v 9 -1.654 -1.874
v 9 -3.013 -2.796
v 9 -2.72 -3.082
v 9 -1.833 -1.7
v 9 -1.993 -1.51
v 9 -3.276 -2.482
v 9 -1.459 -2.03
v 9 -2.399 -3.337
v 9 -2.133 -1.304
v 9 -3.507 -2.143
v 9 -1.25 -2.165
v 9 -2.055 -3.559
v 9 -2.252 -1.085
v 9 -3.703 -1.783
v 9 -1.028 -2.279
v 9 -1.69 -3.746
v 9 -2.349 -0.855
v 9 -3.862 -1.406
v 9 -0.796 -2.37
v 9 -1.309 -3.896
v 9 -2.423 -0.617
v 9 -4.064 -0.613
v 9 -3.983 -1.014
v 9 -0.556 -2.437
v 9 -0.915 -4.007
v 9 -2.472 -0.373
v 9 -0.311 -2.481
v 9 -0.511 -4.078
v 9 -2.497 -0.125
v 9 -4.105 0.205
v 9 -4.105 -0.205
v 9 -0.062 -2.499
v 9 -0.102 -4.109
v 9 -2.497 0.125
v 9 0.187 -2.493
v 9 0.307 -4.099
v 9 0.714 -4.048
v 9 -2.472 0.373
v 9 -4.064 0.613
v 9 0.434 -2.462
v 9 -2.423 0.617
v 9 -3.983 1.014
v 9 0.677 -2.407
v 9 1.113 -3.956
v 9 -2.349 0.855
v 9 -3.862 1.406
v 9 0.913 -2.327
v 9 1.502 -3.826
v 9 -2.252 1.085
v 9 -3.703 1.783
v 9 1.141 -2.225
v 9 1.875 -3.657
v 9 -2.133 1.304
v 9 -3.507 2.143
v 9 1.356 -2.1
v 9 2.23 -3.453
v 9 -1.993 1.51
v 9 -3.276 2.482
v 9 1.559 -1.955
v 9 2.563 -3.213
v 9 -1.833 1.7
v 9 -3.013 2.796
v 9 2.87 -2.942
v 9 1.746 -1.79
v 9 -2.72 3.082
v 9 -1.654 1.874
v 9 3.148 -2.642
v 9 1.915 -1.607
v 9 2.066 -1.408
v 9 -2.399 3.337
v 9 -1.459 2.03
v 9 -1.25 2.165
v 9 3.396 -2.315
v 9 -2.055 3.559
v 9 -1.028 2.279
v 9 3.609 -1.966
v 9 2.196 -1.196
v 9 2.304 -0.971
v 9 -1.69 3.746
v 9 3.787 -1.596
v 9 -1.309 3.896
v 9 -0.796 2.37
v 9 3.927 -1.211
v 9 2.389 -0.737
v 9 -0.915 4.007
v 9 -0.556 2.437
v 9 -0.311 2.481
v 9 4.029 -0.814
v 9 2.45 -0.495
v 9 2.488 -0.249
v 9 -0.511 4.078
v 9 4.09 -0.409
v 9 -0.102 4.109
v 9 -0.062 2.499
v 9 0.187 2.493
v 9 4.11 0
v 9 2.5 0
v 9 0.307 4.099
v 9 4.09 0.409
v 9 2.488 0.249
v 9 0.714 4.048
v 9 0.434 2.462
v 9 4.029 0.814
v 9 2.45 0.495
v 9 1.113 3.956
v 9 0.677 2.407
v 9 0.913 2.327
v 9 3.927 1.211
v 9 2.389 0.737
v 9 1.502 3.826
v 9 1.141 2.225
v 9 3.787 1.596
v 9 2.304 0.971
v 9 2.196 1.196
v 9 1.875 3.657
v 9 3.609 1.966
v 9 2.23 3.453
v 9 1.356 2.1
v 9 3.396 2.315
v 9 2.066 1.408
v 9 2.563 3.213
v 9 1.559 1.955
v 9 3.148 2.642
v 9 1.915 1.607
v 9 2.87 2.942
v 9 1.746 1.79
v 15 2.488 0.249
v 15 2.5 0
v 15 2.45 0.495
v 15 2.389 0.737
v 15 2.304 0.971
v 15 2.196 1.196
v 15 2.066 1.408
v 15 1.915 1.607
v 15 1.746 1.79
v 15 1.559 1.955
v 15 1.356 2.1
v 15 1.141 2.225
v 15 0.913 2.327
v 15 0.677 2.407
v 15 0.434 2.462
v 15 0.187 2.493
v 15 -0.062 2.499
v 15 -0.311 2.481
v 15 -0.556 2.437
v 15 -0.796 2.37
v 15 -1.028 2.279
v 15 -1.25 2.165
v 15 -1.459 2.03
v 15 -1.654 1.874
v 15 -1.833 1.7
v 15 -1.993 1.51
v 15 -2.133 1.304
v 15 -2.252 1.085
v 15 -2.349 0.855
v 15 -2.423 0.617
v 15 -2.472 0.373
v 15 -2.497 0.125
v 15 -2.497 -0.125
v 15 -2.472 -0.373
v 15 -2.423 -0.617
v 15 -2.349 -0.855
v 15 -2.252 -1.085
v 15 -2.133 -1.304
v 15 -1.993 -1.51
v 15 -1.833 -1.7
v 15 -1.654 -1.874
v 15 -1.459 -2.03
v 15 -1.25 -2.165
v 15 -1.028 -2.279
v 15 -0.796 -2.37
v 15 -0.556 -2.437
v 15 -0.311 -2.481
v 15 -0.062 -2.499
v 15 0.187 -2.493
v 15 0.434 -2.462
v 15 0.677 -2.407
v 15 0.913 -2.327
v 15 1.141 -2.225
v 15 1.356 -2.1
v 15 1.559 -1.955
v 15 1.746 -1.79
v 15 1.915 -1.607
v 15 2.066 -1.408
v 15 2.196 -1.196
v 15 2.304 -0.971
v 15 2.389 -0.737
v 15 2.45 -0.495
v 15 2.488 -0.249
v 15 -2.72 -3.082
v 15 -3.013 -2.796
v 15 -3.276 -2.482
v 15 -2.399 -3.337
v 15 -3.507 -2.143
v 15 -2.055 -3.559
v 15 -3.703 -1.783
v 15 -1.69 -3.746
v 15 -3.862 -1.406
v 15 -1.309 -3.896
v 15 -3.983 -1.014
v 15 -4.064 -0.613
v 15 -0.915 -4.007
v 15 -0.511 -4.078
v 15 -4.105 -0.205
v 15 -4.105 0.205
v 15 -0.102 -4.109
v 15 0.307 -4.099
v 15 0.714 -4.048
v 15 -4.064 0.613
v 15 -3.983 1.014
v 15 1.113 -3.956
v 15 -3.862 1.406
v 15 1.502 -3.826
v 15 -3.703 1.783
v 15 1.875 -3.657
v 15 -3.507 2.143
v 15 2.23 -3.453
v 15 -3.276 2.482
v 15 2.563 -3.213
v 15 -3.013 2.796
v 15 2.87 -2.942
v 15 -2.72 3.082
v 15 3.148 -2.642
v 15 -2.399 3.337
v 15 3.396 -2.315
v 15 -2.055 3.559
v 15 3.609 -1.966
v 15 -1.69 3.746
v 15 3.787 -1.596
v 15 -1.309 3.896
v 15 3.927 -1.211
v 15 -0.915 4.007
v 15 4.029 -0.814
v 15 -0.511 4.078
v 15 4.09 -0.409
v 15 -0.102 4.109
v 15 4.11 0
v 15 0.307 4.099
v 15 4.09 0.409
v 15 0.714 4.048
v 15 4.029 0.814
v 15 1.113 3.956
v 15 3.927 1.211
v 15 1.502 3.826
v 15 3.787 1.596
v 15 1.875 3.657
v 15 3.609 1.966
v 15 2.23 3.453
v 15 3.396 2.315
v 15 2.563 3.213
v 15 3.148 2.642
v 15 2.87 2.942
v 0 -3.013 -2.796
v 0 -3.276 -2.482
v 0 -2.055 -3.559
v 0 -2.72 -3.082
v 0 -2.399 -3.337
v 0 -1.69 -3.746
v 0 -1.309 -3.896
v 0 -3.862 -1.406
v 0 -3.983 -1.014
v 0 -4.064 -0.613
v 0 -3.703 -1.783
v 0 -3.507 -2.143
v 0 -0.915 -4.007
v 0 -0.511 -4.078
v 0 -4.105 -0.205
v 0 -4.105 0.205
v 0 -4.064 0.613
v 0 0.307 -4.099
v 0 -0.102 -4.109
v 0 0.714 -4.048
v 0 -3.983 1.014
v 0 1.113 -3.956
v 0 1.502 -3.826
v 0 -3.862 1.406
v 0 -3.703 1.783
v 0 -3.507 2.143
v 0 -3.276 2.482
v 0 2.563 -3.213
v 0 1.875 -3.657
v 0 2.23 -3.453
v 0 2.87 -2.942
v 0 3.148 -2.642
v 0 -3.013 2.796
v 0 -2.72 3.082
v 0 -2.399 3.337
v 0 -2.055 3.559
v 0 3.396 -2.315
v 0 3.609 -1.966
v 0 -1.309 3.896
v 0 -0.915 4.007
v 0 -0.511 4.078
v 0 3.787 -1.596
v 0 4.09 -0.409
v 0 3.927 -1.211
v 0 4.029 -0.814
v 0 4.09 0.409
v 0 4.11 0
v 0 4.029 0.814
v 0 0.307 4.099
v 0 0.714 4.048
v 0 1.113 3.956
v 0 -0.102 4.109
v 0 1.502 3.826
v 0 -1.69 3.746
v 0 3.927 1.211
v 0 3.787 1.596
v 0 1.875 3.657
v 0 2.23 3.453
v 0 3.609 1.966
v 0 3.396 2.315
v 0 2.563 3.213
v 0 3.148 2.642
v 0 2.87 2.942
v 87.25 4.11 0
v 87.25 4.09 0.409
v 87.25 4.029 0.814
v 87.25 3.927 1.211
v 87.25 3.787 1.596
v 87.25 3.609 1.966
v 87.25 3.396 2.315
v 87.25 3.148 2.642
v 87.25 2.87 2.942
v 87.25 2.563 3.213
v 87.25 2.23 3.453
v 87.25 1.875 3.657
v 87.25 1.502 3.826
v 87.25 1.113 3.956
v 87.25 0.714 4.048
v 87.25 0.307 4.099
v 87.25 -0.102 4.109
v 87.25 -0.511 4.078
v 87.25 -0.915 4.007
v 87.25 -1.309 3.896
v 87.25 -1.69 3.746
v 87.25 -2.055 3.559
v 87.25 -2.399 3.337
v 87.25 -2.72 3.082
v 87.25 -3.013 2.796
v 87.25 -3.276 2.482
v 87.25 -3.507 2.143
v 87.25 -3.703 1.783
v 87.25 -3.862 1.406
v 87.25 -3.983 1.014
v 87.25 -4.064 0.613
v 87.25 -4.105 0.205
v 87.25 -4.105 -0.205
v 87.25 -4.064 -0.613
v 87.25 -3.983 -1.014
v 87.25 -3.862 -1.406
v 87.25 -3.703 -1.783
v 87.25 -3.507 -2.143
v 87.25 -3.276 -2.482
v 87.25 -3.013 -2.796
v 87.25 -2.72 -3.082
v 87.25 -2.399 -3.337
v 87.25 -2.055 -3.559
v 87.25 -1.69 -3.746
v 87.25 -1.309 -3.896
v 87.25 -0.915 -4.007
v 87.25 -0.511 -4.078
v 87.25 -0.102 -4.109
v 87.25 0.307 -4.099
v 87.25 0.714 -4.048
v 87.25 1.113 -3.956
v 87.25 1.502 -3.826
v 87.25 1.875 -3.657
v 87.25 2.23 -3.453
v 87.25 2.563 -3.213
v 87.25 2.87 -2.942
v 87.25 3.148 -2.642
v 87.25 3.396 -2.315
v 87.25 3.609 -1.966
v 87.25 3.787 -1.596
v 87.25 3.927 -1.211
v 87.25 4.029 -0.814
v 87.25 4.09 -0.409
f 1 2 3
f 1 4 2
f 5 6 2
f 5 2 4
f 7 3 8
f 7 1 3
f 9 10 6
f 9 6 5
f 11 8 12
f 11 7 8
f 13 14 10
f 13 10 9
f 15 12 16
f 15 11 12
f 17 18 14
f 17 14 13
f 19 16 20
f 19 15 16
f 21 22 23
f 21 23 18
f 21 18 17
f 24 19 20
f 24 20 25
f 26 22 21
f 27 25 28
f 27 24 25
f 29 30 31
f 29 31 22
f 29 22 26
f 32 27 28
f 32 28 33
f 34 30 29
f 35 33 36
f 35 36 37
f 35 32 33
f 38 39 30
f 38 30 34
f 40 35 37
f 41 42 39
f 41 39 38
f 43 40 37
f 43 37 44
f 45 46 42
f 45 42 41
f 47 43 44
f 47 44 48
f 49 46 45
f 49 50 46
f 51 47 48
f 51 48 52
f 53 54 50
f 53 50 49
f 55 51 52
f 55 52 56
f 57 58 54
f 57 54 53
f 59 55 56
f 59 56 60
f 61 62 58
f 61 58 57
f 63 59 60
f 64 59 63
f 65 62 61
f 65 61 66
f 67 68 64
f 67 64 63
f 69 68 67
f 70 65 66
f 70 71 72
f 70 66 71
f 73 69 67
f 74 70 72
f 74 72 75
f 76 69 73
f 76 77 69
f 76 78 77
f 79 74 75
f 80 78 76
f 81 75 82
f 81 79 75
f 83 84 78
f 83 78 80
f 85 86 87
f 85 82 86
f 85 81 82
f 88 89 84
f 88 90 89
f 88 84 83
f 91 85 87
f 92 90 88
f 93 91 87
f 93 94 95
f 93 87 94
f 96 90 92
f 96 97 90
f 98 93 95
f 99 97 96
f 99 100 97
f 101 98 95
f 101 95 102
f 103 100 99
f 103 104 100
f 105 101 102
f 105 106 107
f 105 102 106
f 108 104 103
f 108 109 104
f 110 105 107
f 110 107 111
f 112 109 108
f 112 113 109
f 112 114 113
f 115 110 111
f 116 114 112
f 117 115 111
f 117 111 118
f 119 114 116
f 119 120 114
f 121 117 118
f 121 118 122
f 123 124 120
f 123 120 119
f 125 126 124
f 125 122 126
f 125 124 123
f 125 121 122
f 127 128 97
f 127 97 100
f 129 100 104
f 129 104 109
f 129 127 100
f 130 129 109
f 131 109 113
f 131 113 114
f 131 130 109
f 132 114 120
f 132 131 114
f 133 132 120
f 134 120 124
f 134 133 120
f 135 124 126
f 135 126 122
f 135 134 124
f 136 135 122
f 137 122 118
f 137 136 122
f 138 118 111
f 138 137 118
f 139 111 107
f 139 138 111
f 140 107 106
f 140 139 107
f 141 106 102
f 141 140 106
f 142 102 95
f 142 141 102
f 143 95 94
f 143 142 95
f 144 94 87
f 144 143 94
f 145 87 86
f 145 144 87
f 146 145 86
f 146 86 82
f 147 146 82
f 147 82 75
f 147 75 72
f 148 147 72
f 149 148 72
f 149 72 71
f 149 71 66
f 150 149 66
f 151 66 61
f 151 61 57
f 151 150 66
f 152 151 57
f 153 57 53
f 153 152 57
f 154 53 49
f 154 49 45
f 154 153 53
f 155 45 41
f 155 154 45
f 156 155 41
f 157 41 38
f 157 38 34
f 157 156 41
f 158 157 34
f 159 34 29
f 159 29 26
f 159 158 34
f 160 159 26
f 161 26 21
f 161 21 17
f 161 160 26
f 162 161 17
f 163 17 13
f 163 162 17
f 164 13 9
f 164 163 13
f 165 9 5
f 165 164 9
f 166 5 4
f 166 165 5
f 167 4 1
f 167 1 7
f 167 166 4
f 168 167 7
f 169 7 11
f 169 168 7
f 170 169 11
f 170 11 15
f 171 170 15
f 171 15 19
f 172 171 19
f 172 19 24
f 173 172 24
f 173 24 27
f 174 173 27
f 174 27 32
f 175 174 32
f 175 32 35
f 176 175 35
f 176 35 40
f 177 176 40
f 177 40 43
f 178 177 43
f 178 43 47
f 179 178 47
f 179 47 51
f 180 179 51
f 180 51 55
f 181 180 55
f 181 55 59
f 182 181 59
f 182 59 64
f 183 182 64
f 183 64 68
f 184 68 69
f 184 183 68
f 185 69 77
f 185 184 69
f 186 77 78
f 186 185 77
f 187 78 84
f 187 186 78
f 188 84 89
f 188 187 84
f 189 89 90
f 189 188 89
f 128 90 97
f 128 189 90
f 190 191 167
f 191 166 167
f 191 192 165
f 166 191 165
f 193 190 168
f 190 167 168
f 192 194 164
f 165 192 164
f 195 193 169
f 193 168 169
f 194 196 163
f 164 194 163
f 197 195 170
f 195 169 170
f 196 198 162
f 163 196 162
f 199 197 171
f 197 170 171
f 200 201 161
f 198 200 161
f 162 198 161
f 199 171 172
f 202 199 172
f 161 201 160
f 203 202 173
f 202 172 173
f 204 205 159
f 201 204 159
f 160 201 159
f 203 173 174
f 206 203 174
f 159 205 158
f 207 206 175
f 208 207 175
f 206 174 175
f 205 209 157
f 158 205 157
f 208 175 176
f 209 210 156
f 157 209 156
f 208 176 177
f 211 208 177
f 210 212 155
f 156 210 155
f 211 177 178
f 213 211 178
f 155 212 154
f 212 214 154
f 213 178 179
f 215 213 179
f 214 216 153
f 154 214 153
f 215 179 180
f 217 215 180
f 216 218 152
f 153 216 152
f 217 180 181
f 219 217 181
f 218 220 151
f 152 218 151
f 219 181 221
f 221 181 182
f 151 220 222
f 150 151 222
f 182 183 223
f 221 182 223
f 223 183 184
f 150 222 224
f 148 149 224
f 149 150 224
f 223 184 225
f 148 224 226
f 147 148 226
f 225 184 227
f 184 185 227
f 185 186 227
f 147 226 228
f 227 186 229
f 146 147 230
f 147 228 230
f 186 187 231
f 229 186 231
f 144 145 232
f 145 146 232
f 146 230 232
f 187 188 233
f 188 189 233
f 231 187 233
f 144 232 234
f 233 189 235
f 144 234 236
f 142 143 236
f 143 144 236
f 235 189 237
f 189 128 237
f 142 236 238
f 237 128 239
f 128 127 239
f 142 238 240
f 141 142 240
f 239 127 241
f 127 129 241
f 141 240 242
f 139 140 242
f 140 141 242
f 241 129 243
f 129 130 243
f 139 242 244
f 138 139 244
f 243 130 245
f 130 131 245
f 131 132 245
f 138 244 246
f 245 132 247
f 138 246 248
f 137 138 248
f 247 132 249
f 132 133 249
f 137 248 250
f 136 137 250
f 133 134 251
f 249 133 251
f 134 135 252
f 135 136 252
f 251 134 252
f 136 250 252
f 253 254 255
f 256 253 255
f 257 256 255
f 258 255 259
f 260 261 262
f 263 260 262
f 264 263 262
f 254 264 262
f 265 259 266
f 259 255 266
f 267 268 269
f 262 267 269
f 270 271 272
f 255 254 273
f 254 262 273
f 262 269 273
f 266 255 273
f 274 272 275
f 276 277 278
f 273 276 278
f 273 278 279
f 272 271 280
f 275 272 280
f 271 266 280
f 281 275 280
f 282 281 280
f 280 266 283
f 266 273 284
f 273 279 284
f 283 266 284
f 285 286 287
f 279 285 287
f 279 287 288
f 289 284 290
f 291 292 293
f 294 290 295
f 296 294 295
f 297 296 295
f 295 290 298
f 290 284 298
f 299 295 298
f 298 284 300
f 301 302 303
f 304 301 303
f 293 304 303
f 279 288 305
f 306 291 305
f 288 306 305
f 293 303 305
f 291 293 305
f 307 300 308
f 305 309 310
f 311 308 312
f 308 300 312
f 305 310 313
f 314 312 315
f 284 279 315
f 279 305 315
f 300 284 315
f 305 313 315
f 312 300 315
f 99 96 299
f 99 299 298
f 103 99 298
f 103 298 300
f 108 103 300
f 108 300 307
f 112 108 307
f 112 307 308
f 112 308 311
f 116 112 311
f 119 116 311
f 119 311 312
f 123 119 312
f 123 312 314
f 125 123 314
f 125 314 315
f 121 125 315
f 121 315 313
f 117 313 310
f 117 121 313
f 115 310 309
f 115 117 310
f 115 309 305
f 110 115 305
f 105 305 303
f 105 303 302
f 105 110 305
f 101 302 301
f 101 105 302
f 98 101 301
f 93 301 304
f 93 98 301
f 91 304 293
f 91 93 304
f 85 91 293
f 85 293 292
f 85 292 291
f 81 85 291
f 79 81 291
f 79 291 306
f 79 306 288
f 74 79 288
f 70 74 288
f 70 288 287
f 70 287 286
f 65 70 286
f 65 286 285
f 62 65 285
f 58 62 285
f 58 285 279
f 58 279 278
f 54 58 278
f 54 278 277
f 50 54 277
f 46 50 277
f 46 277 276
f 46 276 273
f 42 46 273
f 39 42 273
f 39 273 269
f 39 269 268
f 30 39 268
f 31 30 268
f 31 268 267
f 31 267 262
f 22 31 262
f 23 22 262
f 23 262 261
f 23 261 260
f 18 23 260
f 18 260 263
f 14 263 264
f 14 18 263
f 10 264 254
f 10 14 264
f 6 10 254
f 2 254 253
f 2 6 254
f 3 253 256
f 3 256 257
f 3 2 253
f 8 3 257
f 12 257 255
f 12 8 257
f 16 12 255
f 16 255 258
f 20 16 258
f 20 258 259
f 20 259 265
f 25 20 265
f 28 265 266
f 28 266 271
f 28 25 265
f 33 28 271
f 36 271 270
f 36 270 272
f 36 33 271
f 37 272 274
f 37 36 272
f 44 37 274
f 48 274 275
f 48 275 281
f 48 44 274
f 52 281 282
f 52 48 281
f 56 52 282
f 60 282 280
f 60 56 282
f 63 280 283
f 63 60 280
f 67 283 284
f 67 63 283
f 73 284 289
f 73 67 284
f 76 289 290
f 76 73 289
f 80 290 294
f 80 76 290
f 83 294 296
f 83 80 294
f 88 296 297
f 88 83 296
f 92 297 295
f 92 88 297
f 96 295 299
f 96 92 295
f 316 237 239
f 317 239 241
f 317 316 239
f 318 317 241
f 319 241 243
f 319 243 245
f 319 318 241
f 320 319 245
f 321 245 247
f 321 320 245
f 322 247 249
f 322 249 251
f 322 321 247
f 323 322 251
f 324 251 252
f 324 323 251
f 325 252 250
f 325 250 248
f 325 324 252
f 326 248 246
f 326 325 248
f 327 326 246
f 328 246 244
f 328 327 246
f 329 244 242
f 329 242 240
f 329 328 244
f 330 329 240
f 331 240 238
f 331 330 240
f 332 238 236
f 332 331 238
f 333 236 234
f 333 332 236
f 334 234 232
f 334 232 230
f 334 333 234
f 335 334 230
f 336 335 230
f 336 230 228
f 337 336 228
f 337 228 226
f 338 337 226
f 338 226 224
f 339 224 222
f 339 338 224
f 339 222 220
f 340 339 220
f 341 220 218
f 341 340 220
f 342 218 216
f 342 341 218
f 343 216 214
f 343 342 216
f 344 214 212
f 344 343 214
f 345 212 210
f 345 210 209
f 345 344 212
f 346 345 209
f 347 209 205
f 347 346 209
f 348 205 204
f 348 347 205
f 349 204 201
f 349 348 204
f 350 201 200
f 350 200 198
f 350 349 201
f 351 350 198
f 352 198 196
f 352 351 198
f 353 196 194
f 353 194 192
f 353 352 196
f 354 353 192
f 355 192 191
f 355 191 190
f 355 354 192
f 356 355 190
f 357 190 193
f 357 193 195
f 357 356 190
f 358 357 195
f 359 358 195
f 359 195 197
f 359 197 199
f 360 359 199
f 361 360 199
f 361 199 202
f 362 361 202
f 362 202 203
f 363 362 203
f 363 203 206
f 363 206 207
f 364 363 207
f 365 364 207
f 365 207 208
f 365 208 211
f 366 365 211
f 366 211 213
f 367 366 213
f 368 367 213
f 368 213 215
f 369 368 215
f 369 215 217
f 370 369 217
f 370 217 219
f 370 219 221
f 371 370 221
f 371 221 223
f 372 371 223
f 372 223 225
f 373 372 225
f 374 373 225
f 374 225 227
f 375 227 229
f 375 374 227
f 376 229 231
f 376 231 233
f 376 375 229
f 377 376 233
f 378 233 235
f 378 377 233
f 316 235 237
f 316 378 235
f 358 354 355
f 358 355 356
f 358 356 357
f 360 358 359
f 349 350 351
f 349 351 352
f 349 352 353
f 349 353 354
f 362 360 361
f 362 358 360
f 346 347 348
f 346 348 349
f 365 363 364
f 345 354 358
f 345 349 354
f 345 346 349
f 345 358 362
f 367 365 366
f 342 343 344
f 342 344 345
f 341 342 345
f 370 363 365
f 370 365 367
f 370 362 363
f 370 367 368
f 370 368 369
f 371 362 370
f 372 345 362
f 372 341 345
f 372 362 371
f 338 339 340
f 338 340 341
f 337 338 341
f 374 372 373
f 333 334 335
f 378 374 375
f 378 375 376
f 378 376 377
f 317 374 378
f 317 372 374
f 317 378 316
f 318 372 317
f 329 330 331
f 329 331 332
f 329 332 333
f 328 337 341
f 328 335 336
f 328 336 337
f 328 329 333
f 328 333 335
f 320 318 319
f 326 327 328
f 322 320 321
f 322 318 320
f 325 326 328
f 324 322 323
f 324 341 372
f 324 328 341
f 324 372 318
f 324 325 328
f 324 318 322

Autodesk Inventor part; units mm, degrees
ref_plane "YZ Plane" through (0, 0, 0) normal (1, 0, 0) x (0, 1, 0)
ref_plane "XZ Plane" through (0, 0, 0) normal (0, 1, 0) x (-1, 0, 0)
ref_plane "XY Plane" through (0, 0, 0) normal (0, 0, 1) x (1, 0, 0)
sketch "Sketch1" plane through (0, 0, 0) normal (0, 0, 1) x (1, 0, 0)
  line L0 (0, 0) -> (0, 4.11)
  line L1 (0, 4.11) -> (9, 4.11)
  line L2 (9, 2.5) -> (9, 4.11)
  line L3 (9, 2.5) -> (15, 2.5)
  line L4 (15, 2.5) -> (15, 4.11)
  line L5 (15, 4.11) -> (87.25, 4.11)
  line L6 (0, 0) -> (87.25, 0)
  line L7 (0, 0) -> (87.25, 0)
  line L8 (87.25, 4.11) -> (87.25, 0)
  dimension "d0" = 4.11
  dimension "d1" = 9
  dimension "d3" = 6
revolve "Revolution1" add sketch "Sketch1" angle 360 about axis through (0, 0, 0) along (1, 0, 0)
properties part number "rod"
